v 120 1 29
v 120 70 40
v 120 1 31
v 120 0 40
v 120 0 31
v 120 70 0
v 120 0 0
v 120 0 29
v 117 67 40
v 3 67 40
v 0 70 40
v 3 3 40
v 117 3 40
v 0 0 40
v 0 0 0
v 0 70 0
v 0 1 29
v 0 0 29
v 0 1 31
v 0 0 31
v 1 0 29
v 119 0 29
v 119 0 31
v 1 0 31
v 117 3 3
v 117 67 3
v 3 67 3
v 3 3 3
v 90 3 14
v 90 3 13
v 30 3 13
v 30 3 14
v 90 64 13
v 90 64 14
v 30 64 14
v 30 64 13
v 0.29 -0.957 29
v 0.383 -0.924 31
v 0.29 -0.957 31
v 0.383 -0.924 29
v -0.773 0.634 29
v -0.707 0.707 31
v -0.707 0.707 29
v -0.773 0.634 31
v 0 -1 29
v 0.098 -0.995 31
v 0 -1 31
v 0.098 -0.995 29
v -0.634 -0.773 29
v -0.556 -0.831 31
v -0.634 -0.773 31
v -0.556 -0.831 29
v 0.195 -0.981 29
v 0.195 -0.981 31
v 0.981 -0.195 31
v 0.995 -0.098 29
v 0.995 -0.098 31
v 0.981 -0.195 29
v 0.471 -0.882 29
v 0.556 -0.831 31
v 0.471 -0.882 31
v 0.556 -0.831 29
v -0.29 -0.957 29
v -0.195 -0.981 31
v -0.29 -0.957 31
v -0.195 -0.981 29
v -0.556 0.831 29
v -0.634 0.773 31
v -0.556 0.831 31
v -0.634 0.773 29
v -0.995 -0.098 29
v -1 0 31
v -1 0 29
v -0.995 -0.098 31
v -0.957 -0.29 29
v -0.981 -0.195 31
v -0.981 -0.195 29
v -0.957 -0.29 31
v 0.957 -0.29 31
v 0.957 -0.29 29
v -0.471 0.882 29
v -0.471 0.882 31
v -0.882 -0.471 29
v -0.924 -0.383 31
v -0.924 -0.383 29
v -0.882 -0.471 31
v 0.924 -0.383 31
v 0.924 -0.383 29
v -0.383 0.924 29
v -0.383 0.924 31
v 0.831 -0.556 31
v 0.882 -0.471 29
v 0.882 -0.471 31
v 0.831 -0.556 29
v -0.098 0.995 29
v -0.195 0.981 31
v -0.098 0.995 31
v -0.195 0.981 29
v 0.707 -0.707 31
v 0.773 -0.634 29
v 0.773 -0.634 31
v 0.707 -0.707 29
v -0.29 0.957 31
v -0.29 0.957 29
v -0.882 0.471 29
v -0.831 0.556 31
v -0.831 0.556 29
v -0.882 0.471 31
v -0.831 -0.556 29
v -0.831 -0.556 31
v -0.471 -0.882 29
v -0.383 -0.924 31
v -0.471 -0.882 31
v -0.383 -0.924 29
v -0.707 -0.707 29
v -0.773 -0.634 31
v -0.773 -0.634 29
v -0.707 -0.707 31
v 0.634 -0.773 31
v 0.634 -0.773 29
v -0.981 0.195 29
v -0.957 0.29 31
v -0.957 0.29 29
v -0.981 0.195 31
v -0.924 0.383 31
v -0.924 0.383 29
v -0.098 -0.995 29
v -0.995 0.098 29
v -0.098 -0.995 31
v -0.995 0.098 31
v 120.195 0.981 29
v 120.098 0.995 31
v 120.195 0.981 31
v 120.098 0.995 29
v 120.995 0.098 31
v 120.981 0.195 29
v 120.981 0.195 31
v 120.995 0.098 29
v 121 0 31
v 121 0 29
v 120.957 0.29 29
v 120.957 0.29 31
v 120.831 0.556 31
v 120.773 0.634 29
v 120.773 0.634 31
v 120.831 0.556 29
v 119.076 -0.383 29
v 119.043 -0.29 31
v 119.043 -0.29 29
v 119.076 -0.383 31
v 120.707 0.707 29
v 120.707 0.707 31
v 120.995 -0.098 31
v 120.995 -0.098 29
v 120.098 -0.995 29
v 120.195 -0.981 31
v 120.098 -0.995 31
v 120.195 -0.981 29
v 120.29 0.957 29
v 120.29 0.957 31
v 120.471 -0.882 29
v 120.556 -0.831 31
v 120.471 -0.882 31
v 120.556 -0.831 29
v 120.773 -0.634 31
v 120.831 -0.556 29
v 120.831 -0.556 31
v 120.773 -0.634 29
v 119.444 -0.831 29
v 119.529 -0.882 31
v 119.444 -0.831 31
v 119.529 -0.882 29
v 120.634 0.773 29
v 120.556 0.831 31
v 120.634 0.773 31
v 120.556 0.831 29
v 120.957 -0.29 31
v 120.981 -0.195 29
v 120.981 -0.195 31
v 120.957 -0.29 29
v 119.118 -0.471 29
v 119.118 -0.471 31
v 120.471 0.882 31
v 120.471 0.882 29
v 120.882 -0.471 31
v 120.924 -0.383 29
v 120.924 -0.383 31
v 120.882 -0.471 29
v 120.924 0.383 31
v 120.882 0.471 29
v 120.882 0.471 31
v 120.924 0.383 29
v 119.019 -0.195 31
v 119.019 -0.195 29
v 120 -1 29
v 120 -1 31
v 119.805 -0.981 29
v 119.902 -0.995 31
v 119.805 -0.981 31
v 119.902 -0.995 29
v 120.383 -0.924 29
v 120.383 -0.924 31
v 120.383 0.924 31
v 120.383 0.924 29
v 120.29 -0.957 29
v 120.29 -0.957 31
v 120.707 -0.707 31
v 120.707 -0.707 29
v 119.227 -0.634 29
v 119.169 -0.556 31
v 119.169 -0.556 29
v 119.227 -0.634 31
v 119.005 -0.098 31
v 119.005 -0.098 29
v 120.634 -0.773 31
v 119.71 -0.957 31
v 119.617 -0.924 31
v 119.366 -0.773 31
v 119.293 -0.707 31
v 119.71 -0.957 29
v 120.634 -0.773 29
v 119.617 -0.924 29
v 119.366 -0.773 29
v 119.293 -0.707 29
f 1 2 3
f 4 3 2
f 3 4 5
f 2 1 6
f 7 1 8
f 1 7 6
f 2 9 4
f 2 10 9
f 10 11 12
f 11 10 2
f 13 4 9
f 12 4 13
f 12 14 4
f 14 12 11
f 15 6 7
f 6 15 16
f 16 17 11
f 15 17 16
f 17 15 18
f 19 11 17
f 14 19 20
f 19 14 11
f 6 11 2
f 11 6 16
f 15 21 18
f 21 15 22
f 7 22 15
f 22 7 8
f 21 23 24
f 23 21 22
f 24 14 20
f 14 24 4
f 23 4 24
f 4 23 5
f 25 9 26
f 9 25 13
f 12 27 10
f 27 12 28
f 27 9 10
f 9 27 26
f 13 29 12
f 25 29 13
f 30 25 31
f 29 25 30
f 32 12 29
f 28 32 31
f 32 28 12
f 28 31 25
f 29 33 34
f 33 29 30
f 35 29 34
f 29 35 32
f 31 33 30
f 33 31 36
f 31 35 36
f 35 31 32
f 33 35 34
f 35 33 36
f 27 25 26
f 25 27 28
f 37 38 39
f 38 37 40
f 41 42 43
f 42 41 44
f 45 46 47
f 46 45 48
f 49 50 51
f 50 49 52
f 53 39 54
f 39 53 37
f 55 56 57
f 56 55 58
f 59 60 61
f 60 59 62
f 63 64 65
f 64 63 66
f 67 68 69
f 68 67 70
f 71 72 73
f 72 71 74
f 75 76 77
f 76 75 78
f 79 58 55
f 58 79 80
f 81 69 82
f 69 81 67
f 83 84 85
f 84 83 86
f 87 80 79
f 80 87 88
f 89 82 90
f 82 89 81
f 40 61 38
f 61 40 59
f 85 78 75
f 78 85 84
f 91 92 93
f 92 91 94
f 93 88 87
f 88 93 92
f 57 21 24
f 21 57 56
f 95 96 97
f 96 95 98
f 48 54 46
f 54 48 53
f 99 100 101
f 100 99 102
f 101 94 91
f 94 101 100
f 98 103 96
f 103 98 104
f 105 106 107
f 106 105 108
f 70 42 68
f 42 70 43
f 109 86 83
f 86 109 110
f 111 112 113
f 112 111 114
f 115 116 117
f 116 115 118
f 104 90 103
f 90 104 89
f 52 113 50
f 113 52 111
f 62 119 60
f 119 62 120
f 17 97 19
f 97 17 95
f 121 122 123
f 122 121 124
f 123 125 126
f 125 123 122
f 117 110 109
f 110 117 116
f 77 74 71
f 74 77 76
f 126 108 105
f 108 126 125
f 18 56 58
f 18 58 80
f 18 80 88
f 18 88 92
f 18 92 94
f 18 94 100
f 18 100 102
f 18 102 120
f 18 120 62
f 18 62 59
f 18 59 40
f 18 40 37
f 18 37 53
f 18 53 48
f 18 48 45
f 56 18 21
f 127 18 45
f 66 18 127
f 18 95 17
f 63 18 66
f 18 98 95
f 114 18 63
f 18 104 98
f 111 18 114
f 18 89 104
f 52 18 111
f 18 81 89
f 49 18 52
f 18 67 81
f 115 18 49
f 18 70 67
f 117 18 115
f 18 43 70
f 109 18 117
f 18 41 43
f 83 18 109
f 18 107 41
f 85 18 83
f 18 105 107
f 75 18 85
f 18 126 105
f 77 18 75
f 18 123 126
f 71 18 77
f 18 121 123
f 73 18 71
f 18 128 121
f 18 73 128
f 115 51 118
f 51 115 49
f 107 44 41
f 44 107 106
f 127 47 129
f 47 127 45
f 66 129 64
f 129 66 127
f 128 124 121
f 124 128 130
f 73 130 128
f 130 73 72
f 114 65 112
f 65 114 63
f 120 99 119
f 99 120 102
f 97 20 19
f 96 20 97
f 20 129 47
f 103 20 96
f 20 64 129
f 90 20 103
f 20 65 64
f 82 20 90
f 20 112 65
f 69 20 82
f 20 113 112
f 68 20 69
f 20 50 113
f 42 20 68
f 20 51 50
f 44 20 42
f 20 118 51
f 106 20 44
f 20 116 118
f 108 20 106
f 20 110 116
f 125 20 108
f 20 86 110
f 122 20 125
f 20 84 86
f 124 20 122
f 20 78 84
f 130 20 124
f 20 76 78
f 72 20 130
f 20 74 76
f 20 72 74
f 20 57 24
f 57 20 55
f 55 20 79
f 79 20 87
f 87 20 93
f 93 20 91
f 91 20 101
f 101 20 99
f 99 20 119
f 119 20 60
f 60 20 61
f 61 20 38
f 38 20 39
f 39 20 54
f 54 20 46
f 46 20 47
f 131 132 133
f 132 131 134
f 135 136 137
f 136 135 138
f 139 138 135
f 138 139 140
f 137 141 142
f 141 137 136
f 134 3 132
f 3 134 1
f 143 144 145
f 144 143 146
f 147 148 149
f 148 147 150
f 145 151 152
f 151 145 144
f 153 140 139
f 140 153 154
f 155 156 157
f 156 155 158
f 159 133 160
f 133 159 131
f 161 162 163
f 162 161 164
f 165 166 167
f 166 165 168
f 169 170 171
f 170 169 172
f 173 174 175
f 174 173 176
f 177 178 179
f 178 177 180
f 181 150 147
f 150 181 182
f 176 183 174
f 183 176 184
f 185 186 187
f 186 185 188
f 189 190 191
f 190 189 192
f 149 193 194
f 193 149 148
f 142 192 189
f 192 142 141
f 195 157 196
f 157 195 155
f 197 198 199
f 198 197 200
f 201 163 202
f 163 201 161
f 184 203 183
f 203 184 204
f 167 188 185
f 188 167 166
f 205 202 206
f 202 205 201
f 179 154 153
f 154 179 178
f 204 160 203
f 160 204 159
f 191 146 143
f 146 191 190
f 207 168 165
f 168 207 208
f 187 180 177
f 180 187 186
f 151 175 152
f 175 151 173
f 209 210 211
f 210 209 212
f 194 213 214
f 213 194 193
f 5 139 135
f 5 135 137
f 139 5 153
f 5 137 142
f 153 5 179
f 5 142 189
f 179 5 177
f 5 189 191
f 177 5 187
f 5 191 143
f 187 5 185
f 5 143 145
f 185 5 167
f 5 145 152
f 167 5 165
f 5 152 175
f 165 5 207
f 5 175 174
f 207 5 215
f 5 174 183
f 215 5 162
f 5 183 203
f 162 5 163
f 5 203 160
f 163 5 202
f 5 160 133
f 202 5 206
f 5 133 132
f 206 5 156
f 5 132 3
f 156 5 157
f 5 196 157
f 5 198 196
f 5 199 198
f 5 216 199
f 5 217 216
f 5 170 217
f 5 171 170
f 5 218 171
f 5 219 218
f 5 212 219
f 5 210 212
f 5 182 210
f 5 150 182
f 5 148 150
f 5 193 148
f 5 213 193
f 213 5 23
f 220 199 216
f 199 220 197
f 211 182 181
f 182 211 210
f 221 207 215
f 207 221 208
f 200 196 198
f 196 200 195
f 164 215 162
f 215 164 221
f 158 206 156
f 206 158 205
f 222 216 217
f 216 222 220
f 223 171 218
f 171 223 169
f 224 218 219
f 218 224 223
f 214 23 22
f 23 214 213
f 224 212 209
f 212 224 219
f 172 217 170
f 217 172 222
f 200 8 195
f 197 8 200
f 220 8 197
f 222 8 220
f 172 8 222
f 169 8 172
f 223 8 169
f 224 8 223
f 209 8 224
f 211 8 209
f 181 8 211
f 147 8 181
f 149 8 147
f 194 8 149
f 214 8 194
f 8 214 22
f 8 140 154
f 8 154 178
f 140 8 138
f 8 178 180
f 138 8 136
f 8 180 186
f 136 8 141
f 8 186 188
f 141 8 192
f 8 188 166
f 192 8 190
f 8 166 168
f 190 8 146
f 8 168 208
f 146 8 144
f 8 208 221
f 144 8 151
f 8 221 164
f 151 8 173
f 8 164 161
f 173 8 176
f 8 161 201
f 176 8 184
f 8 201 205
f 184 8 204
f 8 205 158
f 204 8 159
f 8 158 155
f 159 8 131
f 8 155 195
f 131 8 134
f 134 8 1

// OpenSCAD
// Buffer Tank Design for Mini Horizontal Gel-Electrophoresis Box

// --- Dimensions ---
X_outer = 120;    // Outer length of the tank (mm)
Y_outer = 70;     // Outer width of the tank (mm)
Z_outer = 40;     // Outer height of the tank (mm)
Wall_thickness = 3; // Thickness of the walls (mm)
Floor_thickness = 3; // Thickness of the floor (mm)

Platform_length = 60;  // Length of the central platform in X (mm)
Platform_height_above_inner_floor = 10; // Height of the platform above the inner floor (mm)
Inner_Y = Y_outer - 2 * Wall_thickness; // Inner width of the tank (mm)
Inner_X = X_outer - 2 * Wall_thickness; // Inner length of the tank (mm)

Hole_diameter = 2; // Diameter of the electrode holes (mm)
Hole_z = 30;      // Z-level for the electrode holes (mm)

// --- Calculations based on dimensions ---
Inner_Z_floor = Floor_thickness; // The floor is at z=0, so inner floor is at z=3.
Platform_Z = Inner_Z_floor + Platform_height_above_inner_floor; // Z-level of the platform top (3 + 10 = 13)

// --- Main Tank Body ---
module tank_body() {
    // Outer dimensions: 120x70x40
    cube([X_outer, Y_outer, Z_outer]);
}

// --- Floor ---
module tank_floor() {
    // The floor is at z=0. We model the solid block first.
    translate([0, 0, 0])
    cube([X_outer, Y_outer, Floor_thickness]);
}

// --- Inner Cavity (Hollowed out) ---
module inner_cavity() {
    difference() {
        tank_body();
        // Cut out the interior space. We subtract a slightly smaller box to ensure walls are 3mm thick.
        translate([Wall_thickness, Wall_thickness, 0])
        cube([X_outer - 2 * Wall_thickness, Y_outer - 2 * Wall_thickness, Z_outer]);
    }
}

// --- Gel Platform ---
module gel_platform() {
    // The platform spans the full inner width (Y) and is 60mm long in X, centered.
    // It sits on top of the floor structure.
    translate([ (X_outer - Platform_length) / 2, 0, Platform_Z ])
    cube([Platform_length, Inner_Y, 1]); // Height of platform is 1mm for structural integrity, or just define its shape based on placement.

    // Since the problem states it's a raised platform, we model it as a solid block spanning the inner width.
    // The platform sits at Z = Platform_Z (13). It spans from X = (120-60)/2 = 30 to X = 90.
    translate([30, 0, Platform_Z])
    cube([Platform_length, Inner_Y, 1]); // A thin block representing the platform structure itself.
}

// --- Electrode Holes ---
module electrode_holes() {
    // Drill a 2mm diameter horizontal hole along X at y = 0, z = 30 for both ends.

    // Hole at X = 0 (Left end)
    translate([0, 0, Hole_z - Hole_diameter/2])
    cylinder(r = Hole_diameter / 2, h = 2, $fn = 64);

    // Hole at X = X_outer (Right end)
    translate([X_outer, 0, Hole_z - Hole_diameter/2])
    cylinder(r = Hole_diameter / 2, h = 2, $fn = 64);
}


// --- Assembly ---
union() {
    inner_cavity();
    tank_floor();
    gel_platform();
}

// Add the electrode holes to the final assembly
translate([0, 0, 0]) // Translate back to origin for hole placement relative to the tank base
electrode_holes();
